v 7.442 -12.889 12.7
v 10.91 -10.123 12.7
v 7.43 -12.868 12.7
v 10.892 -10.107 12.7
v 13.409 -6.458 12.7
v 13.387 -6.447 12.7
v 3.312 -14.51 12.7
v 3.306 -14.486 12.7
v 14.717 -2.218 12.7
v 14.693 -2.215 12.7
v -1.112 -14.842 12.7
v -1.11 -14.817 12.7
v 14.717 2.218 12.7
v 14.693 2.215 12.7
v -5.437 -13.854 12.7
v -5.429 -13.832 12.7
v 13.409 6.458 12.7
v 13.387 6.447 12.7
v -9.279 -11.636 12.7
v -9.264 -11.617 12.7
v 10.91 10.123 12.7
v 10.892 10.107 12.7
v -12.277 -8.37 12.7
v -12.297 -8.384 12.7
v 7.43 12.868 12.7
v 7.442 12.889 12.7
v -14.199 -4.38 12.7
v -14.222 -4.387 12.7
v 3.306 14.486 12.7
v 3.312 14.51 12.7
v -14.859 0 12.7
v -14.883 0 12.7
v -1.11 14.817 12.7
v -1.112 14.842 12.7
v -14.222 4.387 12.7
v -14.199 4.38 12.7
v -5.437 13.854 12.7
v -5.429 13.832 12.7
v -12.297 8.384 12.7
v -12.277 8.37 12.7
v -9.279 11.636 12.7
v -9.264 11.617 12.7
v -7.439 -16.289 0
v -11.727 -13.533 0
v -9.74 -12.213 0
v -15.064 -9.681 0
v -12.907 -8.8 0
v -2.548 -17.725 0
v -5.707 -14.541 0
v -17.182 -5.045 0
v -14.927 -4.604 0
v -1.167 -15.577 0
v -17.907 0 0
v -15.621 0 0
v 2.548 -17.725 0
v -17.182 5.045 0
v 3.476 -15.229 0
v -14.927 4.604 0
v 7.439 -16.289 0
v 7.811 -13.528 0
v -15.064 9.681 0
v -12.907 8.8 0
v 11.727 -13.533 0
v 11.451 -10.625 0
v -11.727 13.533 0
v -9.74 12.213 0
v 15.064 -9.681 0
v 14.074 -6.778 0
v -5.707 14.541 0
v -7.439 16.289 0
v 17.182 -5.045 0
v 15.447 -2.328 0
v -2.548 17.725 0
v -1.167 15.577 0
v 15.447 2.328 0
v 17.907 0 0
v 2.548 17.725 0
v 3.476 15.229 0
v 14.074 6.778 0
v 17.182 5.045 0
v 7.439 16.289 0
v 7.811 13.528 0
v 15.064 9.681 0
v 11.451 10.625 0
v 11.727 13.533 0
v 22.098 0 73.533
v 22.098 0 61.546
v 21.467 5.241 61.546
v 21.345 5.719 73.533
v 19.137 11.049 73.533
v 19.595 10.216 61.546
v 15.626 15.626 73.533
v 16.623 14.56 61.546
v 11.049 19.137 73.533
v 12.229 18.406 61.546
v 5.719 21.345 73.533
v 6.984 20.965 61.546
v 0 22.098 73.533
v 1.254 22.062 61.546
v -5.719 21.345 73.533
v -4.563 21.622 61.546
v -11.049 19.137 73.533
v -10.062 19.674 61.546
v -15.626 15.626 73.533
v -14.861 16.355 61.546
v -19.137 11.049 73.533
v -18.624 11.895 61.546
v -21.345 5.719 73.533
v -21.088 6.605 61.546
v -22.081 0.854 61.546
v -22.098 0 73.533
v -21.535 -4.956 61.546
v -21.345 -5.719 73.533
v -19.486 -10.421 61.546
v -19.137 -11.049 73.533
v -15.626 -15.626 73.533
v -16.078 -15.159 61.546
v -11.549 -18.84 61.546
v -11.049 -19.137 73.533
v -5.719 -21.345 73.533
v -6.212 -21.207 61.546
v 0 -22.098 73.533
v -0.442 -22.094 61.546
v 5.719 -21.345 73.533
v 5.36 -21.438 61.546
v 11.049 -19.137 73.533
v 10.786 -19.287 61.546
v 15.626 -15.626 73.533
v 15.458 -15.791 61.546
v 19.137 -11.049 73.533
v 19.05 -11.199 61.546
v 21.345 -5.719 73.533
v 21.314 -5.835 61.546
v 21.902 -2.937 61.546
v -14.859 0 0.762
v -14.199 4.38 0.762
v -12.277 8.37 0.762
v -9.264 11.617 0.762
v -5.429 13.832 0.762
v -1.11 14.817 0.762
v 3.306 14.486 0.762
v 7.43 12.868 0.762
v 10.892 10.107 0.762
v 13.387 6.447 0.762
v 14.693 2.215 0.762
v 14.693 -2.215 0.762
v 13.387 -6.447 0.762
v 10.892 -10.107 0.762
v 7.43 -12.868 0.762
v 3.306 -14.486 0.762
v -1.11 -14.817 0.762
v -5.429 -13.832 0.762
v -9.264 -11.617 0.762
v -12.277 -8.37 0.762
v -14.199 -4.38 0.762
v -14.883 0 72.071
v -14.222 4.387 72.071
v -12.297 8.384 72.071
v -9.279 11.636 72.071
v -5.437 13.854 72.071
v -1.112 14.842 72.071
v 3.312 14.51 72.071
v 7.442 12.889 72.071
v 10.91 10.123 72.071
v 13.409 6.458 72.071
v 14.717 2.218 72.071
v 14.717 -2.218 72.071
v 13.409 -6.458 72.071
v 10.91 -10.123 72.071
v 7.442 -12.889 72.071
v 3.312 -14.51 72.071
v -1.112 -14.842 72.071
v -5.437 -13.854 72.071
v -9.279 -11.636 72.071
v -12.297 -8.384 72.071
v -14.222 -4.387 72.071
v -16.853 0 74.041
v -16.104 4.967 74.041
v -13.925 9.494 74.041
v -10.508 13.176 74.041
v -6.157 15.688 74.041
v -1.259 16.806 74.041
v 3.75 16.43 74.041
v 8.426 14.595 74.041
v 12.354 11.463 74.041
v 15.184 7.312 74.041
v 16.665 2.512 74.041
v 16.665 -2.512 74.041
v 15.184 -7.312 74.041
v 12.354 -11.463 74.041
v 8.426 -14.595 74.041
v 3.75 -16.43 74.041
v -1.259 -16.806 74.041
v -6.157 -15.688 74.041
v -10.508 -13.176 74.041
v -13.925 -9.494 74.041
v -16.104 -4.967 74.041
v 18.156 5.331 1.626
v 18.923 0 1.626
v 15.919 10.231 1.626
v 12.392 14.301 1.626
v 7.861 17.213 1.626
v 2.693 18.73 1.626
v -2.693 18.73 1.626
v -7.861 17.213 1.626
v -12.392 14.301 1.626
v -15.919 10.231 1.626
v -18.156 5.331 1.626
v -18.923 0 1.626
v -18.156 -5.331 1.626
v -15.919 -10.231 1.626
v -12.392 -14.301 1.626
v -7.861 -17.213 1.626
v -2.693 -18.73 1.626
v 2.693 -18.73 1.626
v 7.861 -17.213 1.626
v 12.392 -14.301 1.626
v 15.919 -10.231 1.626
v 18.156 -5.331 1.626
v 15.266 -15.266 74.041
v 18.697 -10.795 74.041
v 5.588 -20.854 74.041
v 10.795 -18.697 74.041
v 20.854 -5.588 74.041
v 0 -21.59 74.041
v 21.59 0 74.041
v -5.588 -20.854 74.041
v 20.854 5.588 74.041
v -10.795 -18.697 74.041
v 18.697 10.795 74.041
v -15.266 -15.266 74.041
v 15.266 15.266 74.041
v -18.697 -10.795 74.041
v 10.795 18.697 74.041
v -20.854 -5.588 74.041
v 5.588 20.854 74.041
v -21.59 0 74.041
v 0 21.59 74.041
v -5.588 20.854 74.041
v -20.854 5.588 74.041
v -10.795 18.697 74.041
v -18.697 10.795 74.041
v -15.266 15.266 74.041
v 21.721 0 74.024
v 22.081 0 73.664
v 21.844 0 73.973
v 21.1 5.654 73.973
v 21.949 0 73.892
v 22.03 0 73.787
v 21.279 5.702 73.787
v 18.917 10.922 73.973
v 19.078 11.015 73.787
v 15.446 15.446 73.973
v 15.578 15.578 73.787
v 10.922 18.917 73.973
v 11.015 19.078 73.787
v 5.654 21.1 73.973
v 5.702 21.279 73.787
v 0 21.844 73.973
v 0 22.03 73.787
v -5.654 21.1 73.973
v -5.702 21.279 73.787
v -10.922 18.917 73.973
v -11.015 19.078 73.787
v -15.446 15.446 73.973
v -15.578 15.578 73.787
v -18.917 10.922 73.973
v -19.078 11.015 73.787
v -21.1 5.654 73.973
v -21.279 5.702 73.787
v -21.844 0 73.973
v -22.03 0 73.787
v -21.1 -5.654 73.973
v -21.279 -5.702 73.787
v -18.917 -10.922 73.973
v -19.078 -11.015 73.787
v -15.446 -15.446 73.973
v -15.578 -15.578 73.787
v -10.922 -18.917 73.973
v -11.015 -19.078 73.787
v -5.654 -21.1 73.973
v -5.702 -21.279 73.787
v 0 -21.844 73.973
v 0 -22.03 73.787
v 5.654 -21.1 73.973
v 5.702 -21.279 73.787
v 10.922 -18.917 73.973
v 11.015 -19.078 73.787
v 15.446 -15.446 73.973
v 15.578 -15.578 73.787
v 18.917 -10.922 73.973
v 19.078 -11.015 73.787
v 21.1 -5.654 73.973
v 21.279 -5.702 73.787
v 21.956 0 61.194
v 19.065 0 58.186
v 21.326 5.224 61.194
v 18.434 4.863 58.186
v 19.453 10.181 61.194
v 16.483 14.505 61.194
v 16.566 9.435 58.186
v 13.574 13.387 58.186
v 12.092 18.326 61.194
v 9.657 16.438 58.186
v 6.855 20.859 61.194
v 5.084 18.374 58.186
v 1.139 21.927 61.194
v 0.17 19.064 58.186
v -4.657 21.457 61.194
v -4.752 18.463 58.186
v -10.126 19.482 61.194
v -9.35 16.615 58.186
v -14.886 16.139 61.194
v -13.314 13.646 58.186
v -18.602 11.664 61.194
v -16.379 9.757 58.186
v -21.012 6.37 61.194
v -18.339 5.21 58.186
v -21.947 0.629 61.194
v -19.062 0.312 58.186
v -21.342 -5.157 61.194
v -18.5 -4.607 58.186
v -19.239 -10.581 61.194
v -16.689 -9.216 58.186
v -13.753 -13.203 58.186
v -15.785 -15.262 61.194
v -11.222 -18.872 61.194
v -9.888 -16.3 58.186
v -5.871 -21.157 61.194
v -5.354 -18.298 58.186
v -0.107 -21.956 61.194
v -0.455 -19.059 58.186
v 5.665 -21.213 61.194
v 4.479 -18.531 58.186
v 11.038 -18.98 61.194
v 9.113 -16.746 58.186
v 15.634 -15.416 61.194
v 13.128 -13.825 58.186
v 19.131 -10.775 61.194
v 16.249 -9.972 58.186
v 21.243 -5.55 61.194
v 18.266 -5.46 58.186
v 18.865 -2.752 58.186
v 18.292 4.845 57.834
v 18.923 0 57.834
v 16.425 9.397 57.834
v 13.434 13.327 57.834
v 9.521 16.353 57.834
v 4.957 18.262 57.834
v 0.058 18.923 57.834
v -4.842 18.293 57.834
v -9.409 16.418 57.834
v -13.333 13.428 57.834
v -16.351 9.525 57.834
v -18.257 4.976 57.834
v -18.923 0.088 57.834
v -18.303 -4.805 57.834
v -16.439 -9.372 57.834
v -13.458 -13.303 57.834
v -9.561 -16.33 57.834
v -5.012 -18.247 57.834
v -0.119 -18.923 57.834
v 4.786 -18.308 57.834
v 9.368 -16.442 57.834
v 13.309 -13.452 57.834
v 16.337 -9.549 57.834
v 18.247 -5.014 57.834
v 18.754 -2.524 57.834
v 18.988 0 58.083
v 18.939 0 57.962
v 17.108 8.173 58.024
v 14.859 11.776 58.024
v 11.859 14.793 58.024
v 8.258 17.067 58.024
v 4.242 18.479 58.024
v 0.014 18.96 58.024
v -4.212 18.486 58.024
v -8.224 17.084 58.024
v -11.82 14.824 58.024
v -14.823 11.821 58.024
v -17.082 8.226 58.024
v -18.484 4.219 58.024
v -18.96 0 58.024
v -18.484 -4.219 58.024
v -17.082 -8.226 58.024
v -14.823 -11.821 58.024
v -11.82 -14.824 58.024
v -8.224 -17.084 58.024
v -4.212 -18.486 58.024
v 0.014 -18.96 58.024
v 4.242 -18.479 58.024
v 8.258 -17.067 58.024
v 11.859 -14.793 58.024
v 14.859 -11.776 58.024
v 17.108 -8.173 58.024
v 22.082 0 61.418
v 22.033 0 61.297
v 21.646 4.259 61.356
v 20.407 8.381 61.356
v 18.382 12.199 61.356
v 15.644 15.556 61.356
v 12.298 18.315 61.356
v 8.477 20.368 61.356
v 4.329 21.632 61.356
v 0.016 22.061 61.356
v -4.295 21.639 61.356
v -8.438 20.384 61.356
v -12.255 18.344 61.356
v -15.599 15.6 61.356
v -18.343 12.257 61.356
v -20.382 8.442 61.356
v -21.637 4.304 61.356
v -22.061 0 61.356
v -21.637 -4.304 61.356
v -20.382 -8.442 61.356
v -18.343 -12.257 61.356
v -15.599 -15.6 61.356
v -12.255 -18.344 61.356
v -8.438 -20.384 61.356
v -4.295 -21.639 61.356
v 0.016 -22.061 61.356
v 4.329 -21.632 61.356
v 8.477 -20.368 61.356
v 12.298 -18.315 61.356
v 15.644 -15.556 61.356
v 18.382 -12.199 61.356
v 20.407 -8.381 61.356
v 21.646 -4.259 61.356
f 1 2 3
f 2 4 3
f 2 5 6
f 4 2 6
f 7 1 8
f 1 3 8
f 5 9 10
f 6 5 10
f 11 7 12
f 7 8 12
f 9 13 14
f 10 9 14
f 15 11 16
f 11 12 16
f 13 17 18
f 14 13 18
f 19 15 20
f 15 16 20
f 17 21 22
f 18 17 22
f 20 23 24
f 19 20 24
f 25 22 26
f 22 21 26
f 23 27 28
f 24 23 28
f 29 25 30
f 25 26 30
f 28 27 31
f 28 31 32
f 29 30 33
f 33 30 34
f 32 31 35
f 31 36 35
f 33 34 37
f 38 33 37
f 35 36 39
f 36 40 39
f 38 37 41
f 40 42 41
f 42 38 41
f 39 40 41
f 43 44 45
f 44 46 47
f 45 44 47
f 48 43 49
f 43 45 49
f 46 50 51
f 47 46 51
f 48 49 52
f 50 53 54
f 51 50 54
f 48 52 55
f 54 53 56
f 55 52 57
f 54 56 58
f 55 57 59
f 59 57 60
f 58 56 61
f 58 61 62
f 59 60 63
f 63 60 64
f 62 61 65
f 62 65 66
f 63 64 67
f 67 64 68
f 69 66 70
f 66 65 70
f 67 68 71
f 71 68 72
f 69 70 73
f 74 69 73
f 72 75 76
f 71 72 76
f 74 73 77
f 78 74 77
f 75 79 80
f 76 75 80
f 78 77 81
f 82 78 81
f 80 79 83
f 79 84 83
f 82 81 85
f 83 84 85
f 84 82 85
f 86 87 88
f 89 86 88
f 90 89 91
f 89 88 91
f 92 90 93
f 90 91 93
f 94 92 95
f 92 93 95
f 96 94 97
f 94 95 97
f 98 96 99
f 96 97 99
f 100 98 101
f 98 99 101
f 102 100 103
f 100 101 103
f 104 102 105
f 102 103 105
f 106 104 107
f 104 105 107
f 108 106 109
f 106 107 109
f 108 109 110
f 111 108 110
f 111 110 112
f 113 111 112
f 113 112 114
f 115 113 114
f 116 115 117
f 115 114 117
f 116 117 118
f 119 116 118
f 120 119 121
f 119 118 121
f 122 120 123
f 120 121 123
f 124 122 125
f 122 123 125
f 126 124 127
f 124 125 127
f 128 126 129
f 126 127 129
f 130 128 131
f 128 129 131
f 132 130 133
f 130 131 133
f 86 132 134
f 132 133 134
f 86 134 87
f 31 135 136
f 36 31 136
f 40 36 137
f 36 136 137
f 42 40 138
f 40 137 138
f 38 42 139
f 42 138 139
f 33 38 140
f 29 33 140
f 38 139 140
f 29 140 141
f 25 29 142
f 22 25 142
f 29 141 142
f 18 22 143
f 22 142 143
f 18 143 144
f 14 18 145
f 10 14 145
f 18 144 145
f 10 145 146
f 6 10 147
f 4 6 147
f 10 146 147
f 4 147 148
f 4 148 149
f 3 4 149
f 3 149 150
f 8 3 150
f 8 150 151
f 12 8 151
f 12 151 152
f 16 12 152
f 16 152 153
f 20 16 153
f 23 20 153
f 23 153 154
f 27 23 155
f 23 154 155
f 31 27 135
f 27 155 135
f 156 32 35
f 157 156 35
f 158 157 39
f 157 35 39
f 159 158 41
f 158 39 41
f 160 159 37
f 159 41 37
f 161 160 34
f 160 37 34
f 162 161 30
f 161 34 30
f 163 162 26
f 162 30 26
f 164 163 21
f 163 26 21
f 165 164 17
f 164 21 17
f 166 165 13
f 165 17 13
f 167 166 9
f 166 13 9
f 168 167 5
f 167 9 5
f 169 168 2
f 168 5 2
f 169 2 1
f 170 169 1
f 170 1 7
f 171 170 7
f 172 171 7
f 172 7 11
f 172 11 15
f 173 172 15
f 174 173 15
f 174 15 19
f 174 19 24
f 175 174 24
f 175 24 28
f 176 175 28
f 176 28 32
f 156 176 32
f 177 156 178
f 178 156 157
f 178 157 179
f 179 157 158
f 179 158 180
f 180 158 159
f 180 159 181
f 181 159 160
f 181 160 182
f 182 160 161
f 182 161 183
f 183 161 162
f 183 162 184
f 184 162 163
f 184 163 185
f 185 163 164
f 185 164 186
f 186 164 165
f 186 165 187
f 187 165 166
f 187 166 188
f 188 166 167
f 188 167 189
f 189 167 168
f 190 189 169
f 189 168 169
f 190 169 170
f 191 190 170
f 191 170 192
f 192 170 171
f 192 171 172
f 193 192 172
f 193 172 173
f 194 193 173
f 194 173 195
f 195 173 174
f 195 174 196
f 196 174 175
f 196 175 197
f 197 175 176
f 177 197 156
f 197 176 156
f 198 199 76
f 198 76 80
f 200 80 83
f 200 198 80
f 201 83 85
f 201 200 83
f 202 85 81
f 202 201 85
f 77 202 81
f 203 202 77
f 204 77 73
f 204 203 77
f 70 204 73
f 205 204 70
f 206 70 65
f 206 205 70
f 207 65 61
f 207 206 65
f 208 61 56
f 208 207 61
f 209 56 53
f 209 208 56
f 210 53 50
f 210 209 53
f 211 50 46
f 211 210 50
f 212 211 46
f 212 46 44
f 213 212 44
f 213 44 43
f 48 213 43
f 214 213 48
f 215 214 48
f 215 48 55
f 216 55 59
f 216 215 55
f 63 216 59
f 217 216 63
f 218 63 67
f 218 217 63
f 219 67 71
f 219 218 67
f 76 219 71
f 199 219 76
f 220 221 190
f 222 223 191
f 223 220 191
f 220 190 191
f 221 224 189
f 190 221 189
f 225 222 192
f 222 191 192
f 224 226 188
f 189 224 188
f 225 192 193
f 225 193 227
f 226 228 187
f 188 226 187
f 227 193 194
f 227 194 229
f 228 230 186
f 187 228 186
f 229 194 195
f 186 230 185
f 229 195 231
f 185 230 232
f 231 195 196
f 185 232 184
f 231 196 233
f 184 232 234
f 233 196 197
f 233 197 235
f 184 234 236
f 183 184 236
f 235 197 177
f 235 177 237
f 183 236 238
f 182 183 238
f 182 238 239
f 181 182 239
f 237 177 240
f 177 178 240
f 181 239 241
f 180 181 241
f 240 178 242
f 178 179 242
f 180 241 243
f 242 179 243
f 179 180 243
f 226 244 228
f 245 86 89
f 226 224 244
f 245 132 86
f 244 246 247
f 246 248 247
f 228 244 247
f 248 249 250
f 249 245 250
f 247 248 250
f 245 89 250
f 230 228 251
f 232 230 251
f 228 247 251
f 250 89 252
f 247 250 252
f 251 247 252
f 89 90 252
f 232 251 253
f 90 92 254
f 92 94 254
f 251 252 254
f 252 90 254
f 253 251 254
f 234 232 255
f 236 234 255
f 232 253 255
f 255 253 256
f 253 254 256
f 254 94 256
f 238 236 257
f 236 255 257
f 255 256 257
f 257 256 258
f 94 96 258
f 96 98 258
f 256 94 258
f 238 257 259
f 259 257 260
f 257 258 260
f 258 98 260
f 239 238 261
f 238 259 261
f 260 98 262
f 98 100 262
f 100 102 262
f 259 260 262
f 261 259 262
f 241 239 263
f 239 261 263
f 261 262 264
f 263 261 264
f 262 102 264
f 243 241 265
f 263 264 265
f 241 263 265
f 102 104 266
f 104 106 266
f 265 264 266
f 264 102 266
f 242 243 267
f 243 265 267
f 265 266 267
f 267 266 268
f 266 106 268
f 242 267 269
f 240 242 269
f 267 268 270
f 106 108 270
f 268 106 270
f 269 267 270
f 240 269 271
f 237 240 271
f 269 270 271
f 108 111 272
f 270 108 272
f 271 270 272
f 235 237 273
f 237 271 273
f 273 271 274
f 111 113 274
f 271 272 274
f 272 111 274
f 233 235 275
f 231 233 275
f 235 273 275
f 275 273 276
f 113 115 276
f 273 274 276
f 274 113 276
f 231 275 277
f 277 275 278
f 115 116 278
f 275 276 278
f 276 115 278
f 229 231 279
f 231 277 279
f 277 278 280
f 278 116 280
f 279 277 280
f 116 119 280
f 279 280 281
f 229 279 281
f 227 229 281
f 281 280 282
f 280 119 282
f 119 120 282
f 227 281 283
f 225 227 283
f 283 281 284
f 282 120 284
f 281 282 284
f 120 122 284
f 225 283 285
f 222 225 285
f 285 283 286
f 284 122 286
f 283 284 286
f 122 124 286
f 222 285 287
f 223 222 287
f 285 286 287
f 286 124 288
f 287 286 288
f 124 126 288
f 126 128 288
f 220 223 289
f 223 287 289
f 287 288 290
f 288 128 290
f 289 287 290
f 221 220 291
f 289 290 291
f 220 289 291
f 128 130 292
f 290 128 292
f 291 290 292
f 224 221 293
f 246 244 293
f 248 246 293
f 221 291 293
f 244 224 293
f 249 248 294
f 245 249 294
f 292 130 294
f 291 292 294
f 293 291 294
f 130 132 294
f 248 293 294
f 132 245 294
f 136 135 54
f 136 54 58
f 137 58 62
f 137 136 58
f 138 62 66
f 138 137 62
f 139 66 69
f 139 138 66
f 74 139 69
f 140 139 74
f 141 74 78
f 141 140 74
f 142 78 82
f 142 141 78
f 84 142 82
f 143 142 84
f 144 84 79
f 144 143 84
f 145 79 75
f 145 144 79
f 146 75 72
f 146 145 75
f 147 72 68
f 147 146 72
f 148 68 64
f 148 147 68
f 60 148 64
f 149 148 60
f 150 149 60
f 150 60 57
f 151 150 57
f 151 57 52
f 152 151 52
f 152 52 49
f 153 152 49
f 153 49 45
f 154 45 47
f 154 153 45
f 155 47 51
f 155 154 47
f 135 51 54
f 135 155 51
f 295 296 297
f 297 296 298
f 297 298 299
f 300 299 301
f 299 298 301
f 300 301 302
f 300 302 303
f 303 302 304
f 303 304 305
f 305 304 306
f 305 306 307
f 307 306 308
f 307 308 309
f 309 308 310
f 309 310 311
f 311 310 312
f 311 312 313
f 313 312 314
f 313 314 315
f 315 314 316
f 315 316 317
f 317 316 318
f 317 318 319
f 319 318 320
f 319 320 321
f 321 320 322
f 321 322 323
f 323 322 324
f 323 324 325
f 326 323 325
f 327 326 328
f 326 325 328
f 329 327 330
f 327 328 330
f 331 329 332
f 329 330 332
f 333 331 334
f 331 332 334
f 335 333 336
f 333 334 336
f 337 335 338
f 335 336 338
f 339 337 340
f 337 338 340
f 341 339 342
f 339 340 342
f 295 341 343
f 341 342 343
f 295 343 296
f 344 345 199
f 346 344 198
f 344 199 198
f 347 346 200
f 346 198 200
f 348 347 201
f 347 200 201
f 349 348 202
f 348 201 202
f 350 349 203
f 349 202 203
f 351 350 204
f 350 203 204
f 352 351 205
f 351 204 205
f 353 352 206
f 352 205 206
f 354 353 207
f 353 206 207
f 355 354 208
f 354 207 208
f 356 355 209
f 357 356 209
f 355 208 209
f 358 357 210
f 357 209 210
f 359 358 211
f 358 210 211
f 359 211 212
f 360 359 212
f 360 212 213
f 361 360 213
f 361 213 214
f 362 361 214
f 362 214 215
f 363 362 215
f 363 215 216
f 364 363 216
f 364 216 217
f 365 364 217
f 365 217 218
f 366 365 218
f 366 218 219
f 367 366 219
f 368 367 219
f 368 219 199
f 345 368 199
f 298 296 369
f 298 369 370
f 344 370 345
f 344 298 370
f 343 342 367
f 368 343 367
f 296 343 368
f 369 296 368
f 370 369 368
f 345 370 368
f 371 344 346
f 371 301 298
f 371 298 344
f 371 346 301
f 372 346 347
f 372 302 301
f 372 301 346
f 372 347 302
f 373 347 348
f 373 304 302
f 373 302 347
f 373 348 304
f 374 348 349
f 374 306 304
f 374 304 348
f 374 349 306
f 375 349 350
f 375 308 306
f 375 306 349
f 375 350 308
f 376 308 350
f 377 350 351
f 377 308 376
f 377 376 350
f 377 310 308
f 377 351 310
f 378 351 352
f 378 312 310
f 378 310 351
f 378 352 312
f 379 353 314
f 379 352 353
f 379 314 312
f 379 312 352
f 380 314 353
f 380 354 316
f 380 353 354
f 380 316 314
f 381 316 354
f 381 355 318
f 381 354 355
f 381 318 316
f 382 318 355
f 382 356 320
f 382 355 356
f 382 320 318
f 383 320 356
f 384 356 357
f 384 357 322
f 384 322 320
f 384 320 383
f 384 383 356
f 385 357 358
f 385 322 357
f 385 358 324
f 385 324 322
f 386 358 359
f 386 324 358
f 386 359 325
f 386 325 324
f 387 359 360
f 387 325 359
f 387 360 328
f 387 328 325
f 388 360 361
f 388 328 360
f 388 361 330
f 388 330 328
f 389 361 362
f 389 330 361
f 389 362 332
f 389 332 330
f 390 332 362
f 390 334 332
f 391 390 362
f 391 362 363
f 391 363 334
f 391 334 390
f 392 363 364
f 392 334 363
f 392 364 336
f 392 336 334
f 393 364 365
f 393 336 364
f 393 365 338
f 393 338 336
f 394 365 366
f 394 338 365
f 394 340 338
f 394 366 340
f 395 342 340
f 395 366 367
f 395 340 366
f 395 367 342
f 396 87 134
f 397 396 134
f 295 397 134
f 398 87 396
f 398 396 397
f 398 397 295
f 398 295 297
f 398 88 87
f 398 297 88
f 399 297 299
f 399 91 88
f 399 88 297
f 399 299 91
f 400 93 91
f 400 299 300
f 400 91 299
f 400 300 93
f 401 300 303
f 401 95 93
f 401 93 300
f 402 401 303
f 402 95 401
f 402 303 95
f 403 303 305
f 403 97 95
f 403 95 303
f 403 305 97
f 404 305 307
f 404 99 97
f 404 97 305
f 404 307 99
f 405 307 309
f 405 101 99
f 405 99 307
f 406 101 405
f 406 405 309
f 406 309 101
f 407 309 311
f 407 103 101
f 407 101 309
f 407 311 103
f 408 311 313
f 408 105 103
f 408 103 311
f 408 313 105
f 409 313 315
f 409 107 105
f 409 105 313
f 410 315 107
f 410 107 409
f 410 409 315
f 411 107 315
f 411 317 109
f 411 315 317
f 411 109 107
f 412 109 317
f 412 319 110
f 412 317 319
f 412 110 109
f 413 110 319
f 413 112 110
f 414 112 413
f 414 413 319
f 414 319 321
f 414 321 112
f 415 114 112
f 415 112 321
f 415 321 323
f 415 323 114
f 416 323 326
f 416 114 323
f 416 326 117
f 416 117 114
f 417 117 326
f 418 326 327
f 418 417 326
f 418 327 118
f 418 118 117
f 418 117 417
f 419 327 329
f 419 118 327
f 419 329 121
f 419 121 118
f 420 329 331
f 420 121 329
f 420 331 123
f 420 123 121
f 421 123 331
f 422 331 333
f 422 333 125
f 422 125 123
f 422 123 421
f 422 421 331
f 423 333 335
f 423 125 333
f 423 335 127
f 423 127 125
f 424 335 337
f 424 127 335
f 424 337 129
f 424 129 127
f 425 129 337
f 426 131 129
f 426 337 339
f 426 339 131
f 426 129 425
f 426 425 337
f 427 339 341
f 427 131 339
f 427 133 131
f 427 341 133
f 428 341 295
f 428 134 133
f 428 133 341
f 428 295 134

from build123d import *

# Parameters (mm, degrees)
SKETCH1_R                           = 18.923
BOSS_EXTRUDE1_DEPTH                 = 74.041
FILLET1_R                           = 0.508
CHAMFER1_SIZE                       = 1.016
CHAMFER1_SIZE2                      = 1.625939882
SKETCH4_R                           = 14.859
CUT_EXTRUDE1_DEPTH                  = 12.7
CHAMFER2_SIZE                       = 0.762
F_1_1_4_12_TAPPED_HOLE1_D           = 29.76626
F_1_1_4_12_TAPPED_HOLE1_DEPTH       = 61.341
F_1_1_4_12_TAPPED_HOLE1_CSINK_D     = 33.7058
F_1_1_4_12_TAPPED_HOLE1_CSINK_ANGLE = 90


with BuildPart() as part:
    # Sketch1 → Boss-Extrude1 (new body)
    with BuildSketch(Plane.XY):
        Circle(SKETCH1_R)
    extrude(amount=BOSS_EXTRUDE1_DEPTH)

    # Sketch3 → Revolve1 (revolve)
    with BuildSketch(Plane(origin=(0, 0, 0), x_dir=(1, 0, 0), z_dir=(0, 1, 0))):
        Polygon((0, -74.041), (22.098, -74.041), (22.098, -61.341), (18.923, -58.039), (0, -58.039), align=None)
    revolve(axis=Axis((0, 0, 0), (0, 0, 1)))

    # Fillet1
    fillet1_edges = [part.edges().sort_by_distance(p)[0] for p in [
        (-18.923, 0, 58.039),
        (-22.098, 0, 74.041),
        (-22.098, 0, 61.341),
    ]]
    fillet(fillet1_edges, radius=FILLET1_R)

    # Chamfer1
    chamfer1_edges = [part.edges().sort_by_distance(p)[0] for p in [
        (-18.923, 0, 0),
    ]]
    chamfer1_side = [part.faces().sort_by_distance(p)[0] for p in [
        (0, 0, 0),
    ]]
    chamfer(chamfer1_edges, length=CHAMFER1_SIZE, length2=CHAMFER1_SIZE2, reference=chamfer1_side[0])

    # Sketch4 → Cut-Extrude1 (cut)
    with BuildSketch(Plane(origin=(0, 0, 0), x_dir=(-1, 0, 0), z_dir=(0, 0, -1))):
        Circle(SKETCH4_R)
    extrude(amount=-CUT_EXTRUDE1_DEPTH, mode=Mode.SUBTRACT)

    # Chamfer2
    chamfer2_edges = [part.edges().sort_by_distance(p)[0] for p in [
        (14.859, 0, 0),
    ]]
    chamfer(chamfer2_edges, length=CHAMFER2_SIZE)

    # 1-1/4-12 Tapped Hole1
    with Locations(Plane.XY.offset(74.041)):
        with Locations((0, 0)):
            CounterSinkHole(F_1_1_4_12_TAPPED_HOLE1_D / 2, F_1_1_4_12_TAPPED_HOLE1_CSINK_D / 2, depth=F_1_1_4_12_TAPPED_HOLE1_DEPTH, counter_sink_angle=F_1_1_4_12_TAPPED_HOLE1_CSINK_ANGLE)


solid = part.part
